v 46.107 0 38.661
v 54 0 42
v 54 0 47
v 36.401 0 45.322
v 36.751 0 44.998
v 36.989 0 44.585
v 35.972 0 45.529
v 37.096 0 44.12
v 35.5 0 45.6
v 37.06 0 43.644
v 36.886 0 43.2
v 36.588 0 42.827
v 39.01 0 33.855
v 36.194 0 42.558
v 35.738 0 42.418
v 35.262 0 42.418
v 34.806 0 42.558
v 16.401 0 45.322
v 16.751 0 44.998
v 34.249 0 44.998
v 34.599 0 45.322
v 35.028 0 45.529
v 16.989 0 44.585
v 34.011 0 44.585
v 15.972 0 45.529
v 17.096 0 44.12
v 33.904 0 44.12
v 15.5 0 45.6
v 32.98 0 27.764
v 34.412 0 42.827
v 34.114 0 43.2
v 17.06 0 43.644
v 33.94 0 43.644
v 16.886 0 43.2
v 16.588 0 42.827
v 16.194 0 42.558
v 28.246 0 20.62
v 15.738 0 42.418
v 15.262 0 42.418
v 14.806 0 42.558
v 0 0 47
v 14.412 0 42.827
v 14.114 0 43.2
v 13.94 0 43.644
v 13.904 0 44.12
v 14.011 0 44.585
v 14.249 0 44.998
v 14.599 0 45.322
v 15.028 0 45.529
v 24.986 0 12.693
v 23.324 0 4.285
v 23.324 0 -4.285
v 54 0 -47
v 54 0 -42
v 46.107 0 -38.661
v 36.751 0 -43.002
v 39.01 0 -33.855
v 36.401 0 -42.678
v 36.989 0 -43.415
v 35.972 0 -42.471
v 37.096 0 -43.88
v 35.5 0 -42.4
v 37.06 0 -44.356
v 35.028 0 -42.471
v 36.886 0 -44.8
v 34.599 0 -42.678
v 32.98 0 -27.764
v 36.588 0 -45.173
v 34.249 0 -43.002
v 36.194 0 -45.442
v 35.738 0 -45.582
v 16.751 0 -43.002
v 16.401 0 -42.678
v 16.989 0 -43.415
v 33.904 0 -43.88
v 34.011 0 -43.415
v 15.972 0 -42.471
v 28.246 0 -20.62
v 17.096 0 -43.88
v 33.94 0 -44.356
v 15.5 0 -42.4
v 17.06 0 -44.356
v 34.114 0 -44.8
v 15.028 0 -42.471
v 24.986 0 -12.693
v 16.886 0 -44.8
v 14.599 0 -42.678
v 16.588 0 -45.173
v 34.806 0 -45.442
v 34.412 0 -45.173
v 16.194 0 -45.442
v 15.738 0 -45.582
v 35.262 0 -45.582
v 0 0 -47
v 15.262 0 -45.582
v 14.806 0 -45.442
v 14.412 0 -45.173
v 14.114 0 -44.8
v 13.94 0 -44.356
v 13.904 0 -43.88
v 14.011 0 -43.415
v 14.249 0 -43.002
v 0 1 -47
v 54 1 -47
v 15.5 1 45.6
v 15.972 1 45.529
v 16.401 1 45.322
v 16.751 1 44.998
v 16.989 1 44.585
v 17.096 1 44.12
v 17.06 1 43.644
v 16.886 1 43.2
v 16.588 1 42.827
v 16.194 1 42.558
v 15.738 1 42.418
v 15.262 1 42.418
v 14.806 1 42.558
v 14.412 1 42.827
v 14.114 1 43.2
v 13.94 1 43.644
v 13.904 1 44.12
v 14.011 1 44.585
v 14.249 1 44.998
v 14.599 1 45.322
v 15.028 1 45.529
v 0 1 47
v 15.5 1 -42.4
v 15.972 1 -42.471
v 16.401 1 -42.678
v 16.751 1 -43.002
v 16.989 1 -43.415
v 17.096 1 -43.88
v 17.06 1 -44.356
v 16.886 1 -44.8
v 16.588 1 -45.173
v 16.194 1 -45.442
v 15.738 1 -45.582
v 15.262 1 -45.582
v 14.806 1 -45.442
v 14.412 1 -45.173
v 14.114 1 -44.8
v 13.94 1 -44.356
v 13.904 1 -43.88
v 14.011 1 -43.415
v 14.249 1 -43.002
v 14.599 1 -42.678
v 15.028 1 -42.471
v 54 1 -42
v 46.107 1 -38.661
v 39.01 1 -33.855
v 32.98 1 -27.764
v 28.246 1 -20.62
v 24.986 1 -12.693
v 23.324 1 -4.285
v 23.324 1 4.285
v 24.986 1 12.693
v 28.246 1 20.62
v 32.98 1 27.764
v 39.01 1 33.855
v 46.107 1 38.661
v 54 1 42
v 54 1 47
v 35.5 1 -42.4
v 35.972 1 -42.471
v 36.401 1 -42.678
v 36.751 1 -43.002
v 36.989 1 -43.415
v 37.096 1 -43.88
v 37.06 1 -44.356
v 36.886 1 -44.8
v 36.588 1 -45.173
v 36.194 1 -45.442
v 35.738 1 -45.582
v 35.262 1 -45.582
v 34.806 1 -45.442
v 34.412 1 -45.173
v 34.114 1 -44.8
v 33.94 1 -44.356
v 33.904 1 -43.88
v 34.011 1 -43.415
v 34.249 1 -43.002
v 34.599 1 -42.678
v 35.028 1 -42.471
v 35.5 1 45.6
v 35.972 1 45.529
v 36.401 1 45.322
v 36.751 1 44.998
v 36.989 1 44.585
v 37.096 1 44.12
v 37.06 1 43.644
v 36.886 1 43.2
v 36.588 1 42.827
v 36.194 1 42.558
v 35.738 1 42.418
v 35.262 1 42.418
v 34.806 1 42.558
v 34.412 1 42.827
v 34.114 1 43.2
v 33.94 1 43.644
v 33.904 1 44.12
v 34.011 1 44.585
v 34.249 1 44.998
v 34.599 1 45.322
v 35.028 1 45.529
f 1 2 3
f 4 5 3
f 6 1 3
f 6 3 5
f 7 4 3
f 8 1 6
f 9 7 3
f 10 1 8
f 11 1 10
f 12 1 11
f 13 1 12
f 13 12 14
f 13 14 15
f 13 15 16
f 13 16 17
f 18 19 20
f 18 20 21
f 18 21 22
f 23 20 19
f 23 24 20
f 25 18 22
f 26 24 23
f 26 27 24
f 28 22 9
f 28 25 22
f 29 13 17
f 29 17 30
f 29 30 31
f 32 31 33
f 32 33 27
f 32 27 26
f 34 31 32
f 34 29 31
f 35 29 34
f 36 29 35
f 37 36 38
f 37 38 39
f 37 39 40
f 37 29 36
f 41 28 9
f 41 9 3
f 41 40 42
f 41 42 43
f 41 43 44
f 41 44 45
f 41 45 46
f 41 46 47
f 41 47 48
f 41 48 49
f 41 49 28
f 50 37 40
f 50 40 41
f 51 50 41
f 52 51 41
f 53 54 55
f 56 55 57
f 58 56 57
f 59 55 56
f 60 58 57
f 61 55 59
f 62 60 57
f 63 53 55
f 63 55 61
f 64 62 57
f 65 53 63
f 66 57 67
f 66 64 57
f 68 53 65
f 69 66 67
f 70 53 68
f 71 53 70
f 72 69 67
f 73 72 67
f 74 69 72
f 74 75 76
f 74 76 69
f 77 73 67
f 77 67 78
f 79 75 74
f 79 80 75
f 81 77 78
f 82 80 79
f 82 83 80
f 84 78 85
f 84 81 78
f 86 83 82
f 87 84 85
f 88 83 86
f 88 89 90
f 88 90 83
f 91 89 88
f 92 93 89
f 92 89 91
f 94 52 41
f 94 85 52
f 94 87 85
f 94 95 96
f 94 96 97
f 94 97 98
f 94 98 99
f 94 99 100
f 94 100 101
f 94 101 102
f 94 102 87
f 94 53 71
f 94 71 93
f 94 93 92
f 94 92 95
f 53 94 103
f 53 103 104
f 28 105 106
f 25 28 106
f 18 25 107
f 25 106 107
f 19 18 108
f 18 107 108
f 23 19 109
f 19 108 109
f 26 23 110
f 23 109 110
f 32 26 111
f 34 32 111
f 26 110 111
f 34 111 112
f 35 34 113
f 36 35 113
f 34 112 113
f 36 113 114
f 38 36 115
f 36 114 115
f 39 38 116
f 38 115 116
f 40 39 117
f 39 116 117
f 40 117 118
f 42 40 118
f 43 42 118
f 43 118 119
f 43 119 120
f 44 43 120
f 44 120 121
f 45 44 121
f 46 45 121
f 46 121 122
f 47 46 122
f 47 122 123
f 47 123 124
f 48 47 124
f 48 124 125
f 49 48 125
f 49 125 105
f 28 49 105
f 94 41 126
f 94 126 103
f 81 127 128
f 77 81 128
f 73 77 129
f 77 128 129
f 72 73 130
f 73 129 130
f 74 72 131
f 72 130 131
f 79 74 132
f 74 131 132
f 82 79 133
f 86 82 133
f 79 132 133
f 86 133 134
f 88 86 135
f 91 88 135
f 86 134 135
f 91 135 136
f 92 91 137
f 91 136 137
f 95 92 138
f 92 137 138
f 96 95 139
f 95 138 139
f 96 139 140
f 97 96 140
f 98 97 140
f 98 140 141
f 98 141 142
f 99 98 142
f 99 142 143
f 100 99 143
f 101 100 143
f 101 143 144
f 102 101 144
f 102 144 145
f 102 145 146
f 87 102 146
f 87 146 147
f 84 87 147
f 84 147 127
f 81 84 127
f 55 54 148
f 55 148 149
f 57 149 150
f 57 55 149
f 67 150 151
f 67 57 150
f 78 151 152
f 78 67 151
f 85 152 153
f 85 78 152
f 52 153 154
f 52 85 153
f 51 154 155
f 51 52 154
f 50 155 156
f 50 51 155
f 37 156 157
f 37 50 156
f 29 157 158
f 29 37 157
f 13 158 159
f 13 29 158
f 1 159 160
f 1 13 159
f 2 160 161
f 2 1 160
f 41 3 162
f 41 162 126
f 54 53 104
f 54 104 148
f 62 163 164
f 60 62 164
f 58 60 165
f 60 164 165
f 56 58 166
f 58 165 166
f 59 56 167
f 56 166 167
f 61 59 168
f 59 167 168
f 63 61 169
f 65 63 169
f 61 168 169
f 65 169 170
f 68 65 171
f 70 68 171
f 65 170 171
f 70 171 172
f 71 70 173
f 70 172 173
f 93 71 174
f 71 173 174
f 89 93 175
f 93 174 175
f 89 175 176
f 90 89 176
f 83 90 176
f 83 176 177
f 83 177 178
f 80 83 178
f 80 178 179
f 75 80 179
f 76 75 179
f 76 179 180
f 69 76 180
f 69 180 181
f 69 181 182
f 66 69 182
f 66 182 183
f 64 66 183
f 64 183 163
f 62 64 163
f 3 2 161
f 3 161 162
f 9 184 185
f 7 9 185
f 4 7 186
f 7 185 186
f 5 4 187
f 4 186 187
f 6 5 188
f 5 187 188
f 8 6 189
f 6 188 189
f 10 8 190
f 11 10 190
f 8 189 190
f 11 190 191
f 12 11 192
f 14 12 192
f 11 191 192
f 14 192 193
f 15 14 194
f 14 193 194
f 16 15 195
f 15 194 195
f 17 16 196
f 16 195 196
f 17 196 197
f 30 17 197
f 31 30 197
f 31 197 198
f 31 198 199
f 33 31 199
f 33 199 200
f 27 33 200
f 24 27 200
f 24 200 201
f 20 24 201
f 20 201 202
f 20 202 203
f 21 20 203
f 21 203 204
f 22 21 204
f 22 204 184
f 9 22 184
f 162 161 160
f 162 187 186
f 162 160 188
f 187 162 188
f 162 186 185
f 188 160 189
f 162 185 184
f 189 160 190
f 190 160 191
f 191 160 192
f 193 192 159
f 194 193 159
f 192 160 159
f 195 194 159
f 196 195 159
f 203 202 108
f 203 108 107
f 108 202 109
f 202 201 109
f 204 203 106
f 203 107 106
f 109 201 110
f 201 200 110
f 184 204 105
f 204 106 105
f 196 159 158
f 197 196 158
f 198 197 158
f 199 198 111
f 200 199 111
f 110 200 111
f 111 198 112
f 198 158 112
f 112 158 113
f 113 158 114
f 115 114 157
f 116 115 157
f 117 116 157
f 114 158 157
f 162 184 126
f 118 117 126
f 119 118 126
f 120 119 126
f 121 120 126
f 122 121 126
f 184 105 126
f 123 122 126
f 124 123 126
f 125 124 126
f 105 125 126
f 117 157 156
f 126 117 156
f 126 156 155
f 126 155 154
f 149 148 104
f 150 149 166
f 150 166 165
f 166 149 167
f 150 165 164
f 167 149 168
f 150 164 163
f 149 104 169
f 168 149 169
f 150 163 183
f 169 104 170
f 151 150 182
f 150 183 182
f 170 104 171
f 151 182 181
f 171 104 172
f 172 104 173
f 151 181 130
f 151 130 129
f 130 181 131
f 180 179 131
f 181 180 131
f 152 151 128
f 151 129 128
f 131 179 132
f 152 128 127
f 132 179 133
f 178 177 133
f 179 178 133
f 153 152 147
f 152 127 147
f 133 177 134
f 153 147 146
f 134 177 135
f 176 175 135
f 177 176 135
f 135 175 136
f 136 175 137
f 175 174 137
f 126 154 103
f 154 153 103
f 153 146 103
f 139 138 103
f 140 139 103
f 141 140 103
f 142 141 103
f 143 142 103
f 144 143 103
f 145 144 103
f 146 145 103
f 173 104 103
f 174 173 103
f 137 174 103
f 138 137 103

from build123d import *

# Parameters (mm, degrees)
EXTRUDE_1_DEPTH     = 1
SKETCH_3_R          = 1.6
CUT_EXTRUDE_1_DEPTH = 10


with BuildPart() as part:
    # 草图2 → 凸台-拉伸1 (new body)
    with BuildSketch(Plane(origin=(0, 0, 0), x_dir=(1, 0, 0), z_dir=(0, 1, 0))):
        with BuildLine():
            Line((0, -47), (0, 47))
            Line((0, 47), (54, 47))
            Line((54, 47), (54, 42))
            ThreePointArc((54, 42), (23.114877049, 0), (54, -42))
            Line((54, -42), (54, -47))
            Line((54, -47), (0, -47))
        make_face()
    extrude(amount=EXTRUDE_1_DEPTH)

    # 草图3 → 切除-拉伸1 (cut)
    with BuildSketch(Plane(origin=(0, 1, 0), x_dir=(1, 0, 0), z_dir=(0, 1, 0))):
        with Locations(Location((15.5, 44, 0), (0, 0, 270))):
            Circle(SKETCH_3_R)
        with Locations(Location((35.5, 44, 0), (0, 0, 270))):
            Circle(SKETCH_3_R)
        with Locations(Location((15.5, -44, 0), (0, 0, 270))):
            Circle(SKETCH_3_R)
        with Locations(Location((35.5, -44, 0), (0, 0, 270))):
            Circle(SKETCH_3_R)
    extrude(amount=-CUT_EXTRUDE_1_DEPTH, mode=Mode.SUBTRACT)


solid = part.part
